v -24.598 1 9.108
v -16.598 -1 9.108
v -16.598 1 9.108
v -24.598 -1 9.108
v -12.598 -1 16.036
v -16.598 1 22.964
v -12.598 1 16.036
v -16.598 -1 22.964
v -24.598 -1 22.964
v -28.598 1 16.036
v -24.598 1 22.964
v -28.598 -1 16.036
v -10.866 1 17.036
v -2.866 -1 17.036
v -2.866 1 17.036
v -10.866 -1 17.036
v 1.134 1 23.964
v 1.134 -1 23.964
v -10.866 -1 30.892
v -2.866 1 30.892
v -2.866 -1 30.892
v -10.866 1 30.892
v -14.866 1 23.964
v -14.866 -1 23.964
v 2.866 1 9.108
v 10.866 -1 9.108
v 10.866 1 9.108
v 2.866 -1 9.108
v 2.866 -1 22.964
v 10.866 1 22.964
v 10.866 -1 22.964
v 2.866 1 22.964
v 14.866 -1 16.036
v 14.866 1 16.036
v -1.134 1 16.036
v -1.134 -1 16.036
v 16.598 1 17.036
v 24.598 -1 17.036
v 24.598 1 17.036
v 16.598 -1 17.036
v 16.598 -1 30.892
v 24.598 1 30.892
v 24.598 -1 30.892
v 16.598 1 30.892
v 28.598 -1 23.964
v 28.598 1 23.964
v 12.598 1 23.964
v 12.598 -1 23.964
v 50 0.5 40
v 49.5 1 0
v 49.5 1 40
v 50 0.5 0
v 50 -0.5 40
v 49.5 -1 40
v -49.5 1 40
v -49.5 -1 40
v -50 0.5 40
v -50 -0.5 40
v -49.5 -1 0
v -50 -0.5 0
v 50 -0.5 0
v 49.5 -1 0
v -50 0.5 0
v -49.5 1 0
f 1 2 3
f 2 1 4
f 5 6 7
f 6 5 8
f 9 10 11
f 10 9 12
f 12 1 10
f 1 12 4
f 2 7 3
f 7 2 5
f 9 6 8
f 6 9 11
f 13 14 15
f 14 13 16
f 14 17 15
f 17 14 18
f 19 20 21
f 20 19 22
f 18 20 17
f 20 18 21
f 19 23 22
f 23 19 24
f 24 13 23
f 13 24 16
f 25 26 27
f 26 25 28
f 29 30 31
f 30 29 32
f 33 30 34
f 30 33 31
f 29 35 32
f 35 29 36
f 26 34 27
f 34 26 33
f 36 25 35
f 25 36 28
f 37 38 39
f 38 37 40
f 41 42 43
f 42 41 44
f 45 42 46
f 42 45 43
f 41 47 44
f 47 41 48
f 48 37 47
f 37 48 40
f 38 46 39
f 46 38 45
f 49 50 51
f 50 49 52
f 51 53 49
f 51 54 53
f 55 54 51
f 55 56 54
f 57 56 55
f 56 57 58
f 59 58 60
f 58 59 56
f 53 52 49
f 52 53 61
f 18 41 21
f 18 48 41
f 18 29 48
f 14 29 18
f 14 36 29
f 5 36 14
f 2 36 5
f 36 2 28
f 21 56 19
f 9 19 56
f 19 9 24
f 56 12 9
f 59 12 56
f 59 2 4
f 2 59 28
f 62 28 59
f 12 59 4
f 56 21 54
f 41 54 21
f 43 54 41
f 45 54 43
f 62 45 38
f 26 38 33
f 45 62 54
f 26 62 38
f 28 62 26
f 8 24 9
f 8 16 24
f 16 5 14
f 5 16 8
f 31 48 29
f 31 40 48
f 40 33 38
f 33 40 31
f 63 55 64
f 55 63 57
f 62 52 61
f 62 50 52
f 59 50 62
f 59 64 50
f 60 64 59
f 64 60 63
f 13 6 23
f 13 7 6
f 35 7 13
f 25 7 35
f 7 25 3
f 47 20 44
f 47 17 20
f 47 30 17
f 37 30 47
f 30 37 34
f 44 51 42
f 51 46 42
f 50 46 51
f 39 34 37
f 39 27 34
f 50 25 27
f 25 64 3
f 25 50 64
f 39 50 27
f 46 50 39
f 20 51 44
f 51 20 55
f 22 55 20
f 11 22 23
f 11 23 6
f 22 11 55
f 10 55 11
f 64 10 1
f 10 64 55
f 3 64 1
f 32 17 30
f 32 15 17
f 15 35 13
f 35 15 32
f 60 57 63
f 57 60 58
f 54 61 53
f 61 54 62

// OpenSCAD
// The Drawer Dividers V3 – Wall
// Divider walls with optional hex/circle pattern and finger grip.

/* [Part] */
// Wall length (mm) – the designer tells you which lengths you need
Length = 100; // [20:0.1:400]
// Wall height (mm, 0 = automatic from the connector height)
Wall_Height = 0; // [0:0.1:150]
// Is this wall used with slip-on connectors? (lowers it by the floor thickness)
For_Slip_On = false;
// How many copies on the plate
Count = 1; // [1:1:40]
// Gap between copies (mm)
Spacing = 5; // [2:1:20]
// Print orientation
Orientation = "standing"; // [standing:Standing (strong, fast), flat:Flat (best with patterns)]

/* [Style] */
// Material-saving pattern
Pattern = "hex"; // [none:None, hex:Honeycomb, circle:Circles]
// Size of one cell (radius, mm)
Cell_Size = 8; // [2:0.5:30]
// Web between two cells (mm)
Web = 2; // [0.5:0.1:10]
// Solid border at both ends (mm, -1 = automatic: insert depth + 2)
Margin_Side = -1; // [-1:1:60]
// Solid border at top and bottom (mm)
Margin_Top_Bottom = 5; // [2:0.5:20]
// Chamfer on the short ends for easy insertion (mm)
End_Chamfer = 0.5; // [0:0.1:2]
// Finger grip at the top centre (radius in mm, 0 = off)
Grip = 0; // [0:0.5:20]

/* [System] */
// Exact thickness of your printed walls (mm)
Wall_Thickness = 2.0; // [0.8:0.1:10]
// Extra slot width so the wall does not bind (mm, 0.2 fits most printers)
Tolerance = 0.2; // [0:0.01:1]
// Height of the connectors (mm)
Height = 40; // [10:1:150]
// How deep the wall slides into an arm (mm)
Insert_Depth = 14; // [5:1:30]
// Closed cap on one end (mm, 0 = open on both ends)
Cap_Thickness = 0; // [0:0.5:10]
// Cap thickness of the slip-on connectors (mm)
Floor_Thickness = 2; // [0.5:0.1:5]
// Gap between wall top and cap (mm)
Top_Gap = 0.2; // [0:0.05:1]

/* [Hidden] */
$fn = 32;

P = dd_profile(
    wall_t = Wall_Thickness, tol = Tolerance, height = Height,
    insert = Insert_Depth, cap = Cap_Thickness, floor_t = Floor_Thickness,
    top_gap = Top_Gap);

h = Wall_Height > 0 ? Wall_Height : dd_wall_height(P, For_Slip_On);
t = dd(P, "wall_t");

module one_wall()
    dd_wall(Length, P, height = h, pattern = Pattern, cell = Cell_Size,
            web = Web, margin_side = Margin_Side, margin_tb = Margin_Top_Bottom,
            end_chamfer = End_Chamfer, grip = Grip);

if (Orientation == "flat")
    dd_grid(Count, Length + Spacing, h + Spacing) translate([0, h / 2, 0]) dd_lay_flat(t) one_wall();
else
    dd_grid(Count, Length + Spacing, t + Spacing) one_wall();

// ============================================================================
//  Library (scad/lib/drawer_divider.scad, inlined by tools/build.py)
// ============================================================================
// =============================================================================
//  The Drawer Dividers – core library (V3)
//  Usage:  use <lib/drawer_divider.scad>
//  All dimensions in mm. This file creates no geometry on its own.
// =============================================================================

DD_VERSION = "3.0.0";
DD_EPS = 0.01;

// =============================================================================
//  System profile
// =============================================================================
// Every part of one drawer is built from the same profile, so walls,
// connectors and rails always fit each other. A profile is a key/value list;
// read single values with dd(p, "key").

function dd_profile(
    wall_t   = 2.0,  // thickness of the printed walls
    tol      = 0.2,  // extra slot width so the wall does not bind
    height   = 40,   // connector height
    insert   = 14,   // how deep a wall slides into a connector arm
    shell    = 2.5,  // connector material left and right of the slot
    arm      = 20,   // arm length, measured from the connector centre
    fillet   = 10,   // inner fillet radius between two arms
    edge_r   = 0.6,  // rounding of the outer vertical edges
    cap      = 0,    // closed cap; 0 = slots open on both ends
    floor_t  = 2,    // cap thickness of slip-on connectors
    lead_in  = 1,    // chamfer at the open slot end
    efc      = 0.4,  // elephant foot compensation at the bed side
    magnet_d = 5,    // magnet / rubber foot pocket, 0 = off
    magnet_h = 2,
    end_gap  = 0.3,  // gap between wall end and pocket bottom
    top_gap  = 0.2   // gap between wall top and cap (capped connectors only)
) = [
    ["wall_t", wall_t], ["tol", tol], ["height", height], ["insert", insert],
    ["shell", shell], ["arm", arm], ["fillet", fillet], ["edge_r", edge_r],
    ["cap", cap], ["floor_t", floor_t], ["lead_in", lead_in], ["efc", efc],
    ["magnet_d", magnet_d], ["magnet_h", magnet_h], ["end_gap", end_gap],
    ["top_gap", top_gap]
];

function dd(p, key) =
    let(i = search([key], p)[0])
    assert(is_num(i), str("dd(): unknown profile key '", key, "'"))
    p[i][1];

// ---- derived values (the designer uses the same formulas) -------------------
// centre distance two connectors on one wall need so their arms do not collide
function dd_min_conn_gap(p) = 2 * dd(p, "arm") + 1;
function dd_slot_w(p)       = dd(p, "wall_t") + dd(p, "tol");
function dd_arm_w(p)        = dd_slot_w(p) + 2 * dd(p, "shell");
function dd_pocket_start(p) = dd(p, "arm") - dd(p, "insert");
// distance from a connector centre to the end of a fully inserted wall
function dd_wall_inset(p)   = dd_pocket_start(p) + dd(p, "end_gap");
function dd_cap(p, slip = false) =
    slip ? max(dd(p, "cap"), dd(p, "floor_t")) : dd(p, "cap");
function dd_wall_height(p, slip = false) =
    let(c = dd_cap(p, slip))
    dd(p, "height") - (c > 0 ? c + dd(p, "top_gap") : 0);
// wall length for two connector centres `center_dist` apart
function dd_wall_length(center_dist, p, ends = 2) =
    center_dist - ends * dd_wall_inset(p);

// =============================================================================
//  Connectors
// =============================================================================
// Directions: 0 = +X, 1 = +Y, 2 = -X, 3 = -Y.
// Definition: [arms, slots, through_y, slip_on]
//   through_y: one continuous slot along Y (the wall passes straight through)
//   slip_on:   printed cap-down, then flipped and pushed onto the walls

function dd_connector_types() = ["cross", "tee", "corner", "straight", "end",
                                  "slip_cross", "slip_tee", "slip_corner_r", "slip_corner_l"];

function dd_connector_def(type) =
    type == "cross"         ? [[1,1,1,1], [1,1,1,1], false, false] :
    type == "tee"           ? [[1,1,1,0], [1,1,1,0], false, false] :
    type == "corner"        ? [[1,1,0,0], [1,1,0,0], false, false] :
    type == "straight"      ? [[1,0,1,0], [1,0,1,0], false, false] :
    type == "end"           ? [[1,0,0,0], [1,0,0,0], false, false] :
    type == "slip_cross"    ? [[1,1,1,1], [1,1,1,1], true,  true ] :
    type == "slip_tee"      ? [[1,1,0,1], [1,1,0,1], true,  true ] :
    type == "slip_corner_r" ? [[1,1,0,0], [1,1,0,1], true,  true ] :
    type == "slip_corner_l" ? [[0,1,1,0], [0,1,1,1], true,  true ] :
    undef;

module dd_connector(type = "cross", p = dd_profile()) {
    def = dd_connector_def(type);
    assert(!is_undef(def), str("dd_connector(): unknown type '", type, "'"));
    dd_connector_custom(arms = def[0], slots = def[1], through_y = def[2],
                        cap = dd_cap(p, def[3]), p = p);
}

// Build any connector from an arm/slot pattern.
module dd_connector_custom(arms = [1,1,1,1], slots = undef, through_y = false,
                           cap = 0, p = dd_profile()) {
    sl  = is_undef(slots) ? arms : slots;
    h   = dd(p, "height");
    aw  = dd_arm_w(p);
    arm = dd(p, "arm");
    ps  = dd_pocket_start(p);
    md  = dd(p, "magnet_d");
    z0  = cap > 0 ? cap : -1;   // slots start above the cap

    difference() {
        linear_extrude(h) dd_connector_outline(arms, p);

        for (i = [0:3]) if (sl[i] && !(through_y && i == 3))
            rotate(90 * i)
                dd_slot_cut(x0 = (through_y && i == 1) ? -(arm + 1) : ps,
                            x1 = arm + 1, z0 = z0, p = p);

        // magnet pocket on the side that faces the drawer floor in use
        if (!through_y && md > 0 && md <= min(aw, 2 * ps) - 1) {
            mh = dd(p, "magnet_h");
            if (cap > 0) translate([0, 0, h - mh]) cylinder(d = md, h = mh + 1, $fn = 48);
            else translate([0, 0, -DD_EPS]) cylinder(d = md, h = mh + DD_EPS, $fn = 48);
        }
    }
}

module dd_connector_outline(arms, p) {
    aw = dd_arm_w(p);
    dd_round_convex(dd(p, "edge_r"))
    dd_round_concave(dd(p, "fillet"))
    union() {
        square(aw, center = true);
        for (i = [0:3]) if (arms[i])
            rotate(90 * i) translate([0, -aw / 2]) square([dd(p, "arm"), aw]);
    }
}

// one slot along +X from x0 to x1, open at the top
module dd_slot_cut(x0, x1, z0, p) {
    h    = dd(p, "height");
    sw   = dd_slot_w(p);
    li   = dd(p, "lead_in");
    efc  = dd(p, "efc");
    len  = x1 - x0;

    translate([x0, -sw / 2, z0]) cube([len, sw, h - z0 + 1]);

    if (li > 0) hull() {
        translate([x0, -sw / 2, h - li]) cube([len, sw, DD_EPS]);
        translate([x0, -sw / 2 - li, h]) cube([len, sw + 2 * li, 1]);
    }
    // only where the slot touches the print bed
    if (z0 < 0 && efc > 0) hull() {
        translate([x0, -sw / 2 - efc, -1]) cube([len, sw + 2 * efc, 1]);
        translate([x0, -sw / 2, efc]) cube([len, sw, DD_EPS]);
    }
}

// footprint size, used to space copies on the plate
function dd_connector_size(p) = 2 * dd(p, "arm");

// =============================================================================
//  Walls
// =============================================================================
// Built standing: X = length, Y = thickness (centred), Z = height.

module dd_wall(length, p = dd_profile(), height = undef, pattern = "none",
               cell = 8, web = 2, margin_side = -1, margin_tb = 5,
               end_chamfer = 0.5, grip = 0) {
    h  = is_undef(height) ? dd_wall_height(p) : height;
    t  = dd(p, "wall_t");
    // keep the pattern out of the connector pockets
    ms = margin_side < 0 ? dd(p, "insert") + 2 : margin_side;

    difference() {
        linear_extrude(h) dd_wall_2d(length, t, end_chamfer);
        dd_wall_pattern(length, t, h, pattern, cell, web, ms,
                        margin_tb, margin_tb + grip);
        if (grip > 0)
            translate([0, 0, h]) rotate([90, 0, 0])
                cylinder(r = grip, h = t + 2, center = true, $fn = 48);
    }
}

module dd_wall_2d(l, t, c) {
    ce = min(c, t / 2 - 0.01);
    if (ce > 0)
        polygon([
            [-l/2 + ce, -t/2], [ l/2 - ce, -t/2], [ l/2, -t/2 + ce], [ l/2,  t/2 - ce],
            [ l/2 - ce,  t/2], [-l/2 + ce,  t/2], [-l/2,  t/2 - ce], [-l/2, -t/2 + ce]
        ]);
    else
        square([l, t], center = true);
}

// Hex or circle pattern with a constant web between the holes.
module dd_wall_pattern(l, t, h, pattern, cell, web, ms, mb, mt) {
    if (pattern == "hex" || pattern == "circle") {
        hex   = pattern == "hex";
        D     = hex ? cell * sqrt(3) + web : 2 * cell + web;  // vertical pitch
        ext_x = cell;
        ext_z = hex ? cell * sqrt(3) / 2 : cell;
        max_w = l - 2 * ms - 2 * ext_x;
        max_h = h - mb - mt - 2 * ext_z;
        stagger = max_h >= D / 2;
        sx    = stagger ? D * sqrt(3) / 2 : 2 * cell + web;
        cols  = max_w >= 0 ? floor(max_w / sx) + 1 : 0;
        st    = stagger && cols > 1;
        rows  = max_h >= 0 ? floor((max_h - (st ? D / 2 : 0)) / D) + 1 : 0;

        if (cols > 0 && rows > 0) {
            pw = (cols - 1) * sx;
            ph = (rows - 1) * D + (st ? D / 2 : 0);
            z0 = mb + ext_z + (max_h - ph) / 2;
            for (c = [0 : cols - 1], r = [0 : rows - 1])
                translate([-pw / 2 + c * sx, 0, z0 + r * D + (st && c % 2 == 1 ? D / 2 : 0)])
                    rotate([90, 0, 0])
                        cylinder(r = cell, h = t + 2, center = true, $fn = hex ? 6 : 32);
        }
    }
}

// =============================================================================
//  Rails ("Raster Wall") – glued or screwed to the drawer side
// =============================================================================
// Built flat: X = length, Y = width (= height in the drawer), Z = thickness.
// Teeth form slots of the system slot width. teeth_offset = position of the
// first tooth from x = 0; -1 centres the pattern. Joined rails use explicit
// offsets so the slot pitch continues across the joint.

function dd_rail_pitch(p, tooth_t = 2) = tooth_t + dd_slot_w(p);

function dd_rail_center_offset(length, p, tooth_t = 2) =
    let(sw = dd_slot_w(p), pitch = tooth_t + sw,
        n = max(1, floor((length + sw) / pitch)),
        used = n * tooth_t + (n - 1) * sw)
    (length - used) / 2;

module dd_rail(length, width, p = dd_profile(), plate = 2.5, tooth_t = 2,
               tooth_h = 6, tooth_chamfer = 0.6, tooth_fillet = 0.5,
               teeth_offset = -1, teeth = true, tongue = true, socket = true,
               tongue_len = 2, tongue_w = -1, tongue_chamfer = 1,
               tol_w = 1, tol_d = 0.5, tol_z = 0.1,
               screws = 3, screw_d = 3.2, head_d = 6.5) {
    sw    = dd_slot_w(p);
    pitch = tooth_t + sw;
    x0    = teeth_offset >= 0 ? teeth_offset : dd_rail_center_offset(length, p, tooth_t);
    n     = floor((length - x0 - tooth_t) / pitch) + 1;
    tw    = tongue_w < 0 ? max(width - 12, width * 0.6) : min(tongue_w, width - 4);
    zt    = plate / 2 - tol_z / 2;
    zs    = plate / 2 + tol_z / 2;

    difference() {
        union() {
            cube([length, width, plate]);
            if (tongue)
                translate([length, (width - tw) / 2, 0]) linear_extrude(zt)
                    polygon([[0, 0], [tongue_len, tongue_chamfer],
                             [tongue_len, tw - tongue_chamfer], [0, tw]]);
            if (teeth && n > 0)
                for (i = [0 : n - 1])
                    translate([x0 + i * pitch, 0, plate - DD_EPS])
                        dd_rail_tooth(width, tooth_t, tooth_h, tooth_chamfer, tooth_fillet);
        }
        if (socket) {
            bw = tw + 2 * tol_w;
            translate([-DD_EPS, (width - bw) / 2, -DD_EPS])
                cube([tongue_len + tol_d + DD_EPS, bw, zs + DD_EPS]);
        }
        // screws sit in the middle of a slot so they damage as few teeth as possible
        if (screws > 0) for (s = [1 : screws]) {
            k  = round((length * s / (screws + 1) - x0 - tooth_t - sw / 2) / pitch);
            xs = x0 + tooth_t + sw / 2 + k * pitch;
            cs = min(1.5, plate - 0.4);
            translate([xs, width / 2, 0]) {
                translate([0, 0, -1]) cylinder(d = screw_d, h = plate + 2, $fn = 32);
                translate([0, 0, plate - cs]) cylinder(d1 = screw_d, d2 = head_d, h = cs + DD_EPS, $fn = 32);
                translate([0, 0, plate]) cylinder(d = head_d + 0.5, h = tooth_h + 1, $fn = 32);
            }
        }
    }
}

// One tooth across the full rail width, with lead-in chamfer and base fillets.
// Keep tooth_fillet <= the wall end chamfer so walls still reach the plate.
module dd_rail_tooth(width, tt, th, ch, fr) {
    c = max(0, min(ch, tt / 2 - 0.2, th - 0.5));
    translate([0, width, 0]) rotate([90, 0, 0]) linear_extrude(width) {
        polygon([[0, 0], [tt, 0], [tt, th - c], [tt - c, th], [c, th], [0, th - c]]);
        if (fr > 0) {
            translate([tt, 0]) dd_fillet_2d(fr);
            mirror([1, 0]) dd_fillet_2d(fr);
        }
    }
}

// =============================================================================
//  Tolerance test
// =============================================================================
// A bar with one slot per tolerance (value engraved next to it) plus a short
// test wall. Print both, find the slot that fits best, use that tolerance.

module dd_tolerance_test(p = dd_profile(), tols = [0.1, 0.15, 0.2, 0.25, 0.3],
                         height = 12, depth = 20, land = 8, base = 1.2,
                         coupon = true) {
    t = dd(p, "wall_t");
    n = len(tols);
    function x_at(i) = land * (i + 1) + i * t + dd_sum(tols, i);
    L = x_at(n);

    difference() {
        cube([L, depth, height]);
        for (i = [0 : n - 1]) {
            translate([x_at(i), -1, base]) cube([t + tols[i], depth + 2, height]);
            translate([x_at(i) - land / 2, depth / 2, height - 0.6])
                linear_extrude(1) rotate(90)
                    text(str(tols[i]), size = min(3.2, land * 0.42),
                         halign = "center", valign = "center");
        }
    }
    if (coupon)
        translate([L / 2, depth + 8, 0])
            dd_wall(30, p, height = height + 4, end_chamfer = 0.3);
}

// =============================================================================
//  Helpers
// =============================================================================

function dd_sum(v, n) = n <= 0 ? 0 : v[n - 1] + dd_sum(v, n - 1);

module dd_round_concave(r) { if (r > 0) offset(r = -r) offset(r = r) children(); else children(); }
module dd_round_convex(r)  { if (r > 0) offset(r = r) offset(delta = -r) children(); else children(); }

module dd_fillet_2d(r) {
    difference() {
        square([r, r]);
        translate([r, r]) circle(r = r, $fn = 24);
    }
}

// Arrange `count` copies of the child in rows that fit max_w, centred on the origin.
module dd_grid(count, pitch_x, pitch_y, max_w = 240) {
    cols = max(1, min(count, floor((max_w + DD_EPS) / pitch_x)));
    rows = ceil(count / cols);
    for (i = [0 : count - 1])
        translate([((i % cols) - (cols - 1) / 2) * pitch_x,
                   (floor(i / cols) - (rows - 1) / 2) * pitch_y, 0])
            children();
}

// Lay a standing wall flat on the bed.
module dd_lay_flat(t) { translate([0, 0, t / 2]) rotate([90, 0, 0]) children(); }

// =============================================================================
//  Drawer layout – used by drawer_designer.scad
// =============================================================================
// The drawer is cut into strips (u axis), each strip into compartments
// (v axis). Strip walls run through from edge to edge. Strips run front to
// back unless `swap` is set. dd_layout() works in u/v and returns world
// coordinates: x = width, y = depth, front edge at y = 0.
// Directions: 0 = +X, 1 = +Y, 2 = -X, 3 = -Y.

function dd_le() = 0.01;   // a function, so inlined single files can use it before this line

// ---- string parsing ("1,1,2" and "2,1:2") ----------------------------------
function dd_str_split(s, sep, i = 0, cur = "", acc = []) =
    i >= len(s) ? concat(acc, [cur])
  : s[i] == sep ? dd_str_split(s, sep, i + 1, "", concat(acc, [cur]))
  : dd_str_split(s, sep, i + 1, str(cur, s[i]), acc);

function dd_str_num(s) = dd__num([for (c = s) if (c != " ") c], 0, 0, 0, 1);
function dd__num(c, i, v, frac, sign) =
    i >= len(c) ? sign * v
  : c[i] == "-" ? dd__num(c, i + 1, v, frac, -1)
  : c[i] == "." ? dd__num(c, i + 1, v, max(frac, 0.1), sign)
  : let(d = ord(c[i]) - 48)
    d < 0 || d > 9 ? dd__num(c, i + 1, v, frac, sign)
  : frac > 0 ? dd__num(c, i + 1, v + d * frac, frac / 10, sign)
             : dd__num(c, i + 1, v * 10 + d, 0, sign);

// "1,1,2" -> [1,1,2]
function dd_parse_weights(s) =
    let(v = [for (p = dd_str_split(s, ",")) let(n = dd_str_num(p)) if (n > 0) n])
    len(v) ? v : [1];

// "2,1:2" -> one weight list per strip; a plain number n = n equal parts.
// Missing entries repeat the last one.
function dd_parse_splits(s, n) =
    let(per = [for (it = dd_str_split(s, ","))
                  let(p = [for (x = dd_str_split(it, ":")) let(v = dd_str_num(x)) if (v > 0) v])
                  len(p) == 0 ? [1]
                : len(p) == 1 ? [for (k = [1 : max(1, round(p[0]))]) 1] : p])
    [for (i = [0 : n - 1]) per[min(i, len(per) - 1)]];

// ---- small list helpers ----------------------------------------------------
function dd_has_num(l, x) = len([for (y = l) if (abs(y - x) < dd_le()) 1]) > 0;
function dd_sort(a) =
    len(a) <= 1 ? a :
    let(p = a[floor(len(a) / 2)])
    concat(dd_sort([for (x = a) if (x < p) x]), [for (x = a) if (x == p) x], dd_sort([for (x = a) if (x > p) x]));
function dd_uniq_sorted(l) = [for (k = [0 : 1 : len(l) - 1]) if (k == 0 || l[k] - l[k - 1] > dd_le()) l[k]];
function dd_unique(l, i = 0, acc = []) =
    i >= len(l) ? acc : dd_unique(l, i + 1, len([for (y = acc) if (y == l[i]) 1]) ? acc : concat(acc, [l[i]]));
function dd_count(l, x) = len([for (y = l) if (y == x) 1]);
function dd_nearest(l, v) = len(l) == 0 ? v : let(d = [for (x = l) abs(x - v)]) l[search(min(d), d)[0]];
function dd_fmt(v, d = 1) = str(round(v * pow(10, d)) / pow(10, d));

// ---- options ---------------------------------------------------------------
function dd_layout_opts(width = 400, depth = 300, height = 60, strips = "1,1,1",
                        splits = "2", swap = false, edge = "frame", slip = false,
                        max_len = 240, edge_gap = 0.5, clamp_gap = 1,
                        rail_plate = 2.5, tooth_t = 2, tooth_h = 6) = [
    ["width", width], ["depth", depth], ["height", height], ["strips", strips],
    ["splits", splits], ["swap", swap], ["edge", edge], ["slip", slip],
    ["max_len", max_len], ["edge_gap", edge_gap], ["clamp_gap", clamp_gap],
    ["rail_plate", rail_plate], ["tooth_t", tooth_t], ["tooth_h", tooth_h]
];

// Rail tooth pattern along one world axis. Rails on the left/right sides run
// the full depth; front/back rails sit between them.
function dd_lay_rail_span(axis, W, D, rt) =
    axis == "y" ? [0.5, D - 1] : [rt + 0.5, W - 2 * rt - 1];

function dd_lay_rail_slots(axis, W, D, rt, tt, p) =
    let(sp = dd_lay_rail_span(axis, W, D, rt), sw = dd_slot_w(p), pitch = tt + sw,
        n = max(1, floor((sp[1] + sw) / pitch)),
        first = sp[0] + dd_rail_center_offset(sp[1], p, tt))
    [for (k = [0 : 1 : n - 2]) first + tt + sw / 2 + k * pitch];

// interior wall centres between c0 and c1 so the *net* compartments follow the weights
function dd_lay_split(c0, c1, off, w, t) =
    let(n = len(w), net = (c1 - off) - (c0 + off) - (n - 1) * t, tot = dd_sum(w, n))
    [for (k = [1 : 1 : n - 1]) c0 + off + net * dd_sum(w, k) / tot + (k - 1) * t + t / 2];

// node: [u, v, dirs, kind ("conn"|"edge"), type, through ("u"|"v"|""), end offset, joint]
function dd_lay_node(u, v, d, edge, slip, end_off, joint = false) =
    let(n = d[0] + d[1] + d[2] + d[3])
    n == 1 && (edge == "rail" || edge == "none") ? [u, v, d, "edge", "", "", end_off, false] :
    let(t0 = n == 4 ? "cross" : n == 3 ? "tee" : n == 1 ? "end"
           : (d[0] == 1 && d[2] == 1) || (d[1] == 1 && d[3] == 1) ? "straight" : "corner",
        th = slip && n >= 3 ? (d[1] == 1 && d[3] == 1 ? "v" : "u") : "")
    [u, v, d, "conn", th == "" ? t0 : (n == 4 ? "slip_cross" : "slip_tee"), th, 0, joint];

// slip-on: positions along a through wall where it should end at a crossing instead of
// getting a joiner squeezed between two connectors (greedy, each piece <= maxlen)
function dd_lay_slip_cuts(stops, prev, last, ins, maxlen, acc = []) =
    last - prev - 2 * ins <= maxlen ? acc :
    let(ok = [for (u = stops) if (u > prev + dd_le() && u < last - dd_le() && u - prev - 2 * ins <= maxlen) u])
    len(ok) == 0 ? acc : dd_lay_slip_cuts(stops, max(ok), last, ins, maxlen, concat(acc, [max(ok)]));

function dd_lay_find(nodes, u, v) =
    let(m = [for (n = nodes) if (abs(n[0] - u) < dd_le() && abs(n[1] - v) < dd_le()) n]) m[0];

function dd_lay_align(v, m, i = 0, acc = []) =
    i >= len(v) ? acc :
    dd_lay_align(v, m, i + 1, concat(acc, [i == 0 ? v[0] :
        [for (y = v[i]) let(prev = acc[i - 1], d = [for (q = prev) abs(q - y)])
            len(prev) && min(d) < m ? prev[search(min(d), d)[0]] : y]]));

function dd_lay_off(n, ins) = n[3] == "edge" ? n[6] : ins;

// joints that split a too long wall, kept clear of other connectors on the line
function dd_lay_kpieces(total, ins, maxlen, k = 1) =
    (total - (k - 1) * 2 * ins) / k <= maxlen || k >= 50 ? k : dd_lay_kpieces(total, ins, maxlen, k + 1);

function dd_lay_joints(u0, u1, o0, o1, ins, maxlen, avoid, clear) =
    let(total = u1 - u0 - o0 - o1, k = dd_lay_kpieces(total, ins, maxlen),
        pl = (total - (k - 1) * 2 * ins) / k)
    k <= 1 ? [] : dd__joints(1, k, u0 + o0, pl, ins, maxlen, avoid, clear, []);

function dd__joints(j, k, start, pl, ins, maxlen, avoid, clear, acc) =
    j >= k ? acc :
    let(ideal = start + j * pl + (2 * j - 1) * ins,
        prev  = len(acc) ? acc[len(acc) - 1] + ins : start,
        cands = [for (d = [0 : 2.5 : 80], c = [ideal + d, ideal - d])
                    if (len([for (a = avoid) if (abs(a - c) < clear) 1]) == 0 && c - ins - prev <= maxlen) c])
    dd__joints(j + 1, k, start, pl, ins, maxlen, avoid, clear, concat(acc, [len(cands) ? cands[0] : ideal]));

// cuts: [[u, offset], ...] -> [pieces [[ori, c, s, e]], joints [[ori, c, u]]]
function dd_lay_line(ori, c, cuts, avoid, ins, maxlen, clear) =
    let(segs = [for (k = [0 : 1 : len(cuts) - 2])
        let(u0 = cuts[k][0], o0 = cuts[k][1], u1 = cuts[k + 1][0], o1 = cuts[k + 1][1],
            js = dd_lay_joints(u0, u1, o0, o1, ins, maxlen,
                               [for (a = avoid) if (a > u0 + dd_le() && a < u1 - dd_le()) a], clear),
            b  = concat([u0 + o0], [for (jc = js) each [jc - ins, jc + ins]], [u1 - o1]))
        [[for (m = [0 : 2 : len(b) - 2]) [ori, c, b[m], b[m + 1]]], js]])
    [[for (s = segs) each s[0]], [for (s = segs) for (jc = s[1]) [ori, c, jc]]];

// Returns a key/value list:
//   walls  [[axis "x"|"y", c, start, end, length], ...]   axis = direction the wall runs
//   conns  [[type, x, y, dirs, through "x"|"y"|"", joint], ...]
//   rails  [[side "L"|"R"|"F"|"B", start, end, length, teeth_offset, tongue, socket, screws], ...]
//   comps  [[x0, y0, x1, y1, net_w, net_d], ...]
//   wall_h, rail_w, rail_t, inset
function dd_layout(p, o) =
    let(
        W = dd(o, "width"), D = dd(o, "depth"), swap = dd(o, "swap"),
        U = swap ? D : W, V = swap ? W : D,
        edge = dd(o, "edge"), slip = dd(o, "slip"), frame = edge == "frame", rail = edge == "rail",
        maxlen = dd(o, "max_len"),
        t = dd(p, "wall_t"), aw = dd_arm_w(p), ins = dd_wall_inset(p),
        tt = dd(o, "tooth_t"), rt = dd(o, "rail_plate") + dd(o, "tooth_h"),
        B = (frame || edge == "endcap") ? aw / 2 + dd(o, "edge_gap") : 0,
        base = frame ? B : 0,
        eoff = frame ? t / 2 : rail ? rt : 0,
        end_off = rail ? dd(o, "rail_plate") + dd(p, "end_gap") : dd(o, "clamp_gap"),
        clear = 2 * dd(p, "arm") + 2,
        cols = dd_parse_weights(dd(o, "strips")), ncol = len(cols),
        rows = dd_parse_splits(dd(o, "splits"), ncol),
        su = rail ? dd_lay_rail_slots(swap ? "y" : "x", W, D, rt, tt, p) : [],
        sv = rail ? dd_lay_rail_slots(swap ? "x" : "y", W, D, rt, tt, p) : [],
        us = concat([base], [for (x = dd_lay_split(base, U - base, eoff, cols, t)) rail ? dd_nearest(su, x) : x], [U - base]),
        // compartment borders that almost line up with the neighbouring strip snap onto it,
        // otherwise the arms of the two connectors on the strip wall would collide
        vsi = dd_lay_align([for (i = [0 : ncol - 1])
                  [for (y = dd_lay_split(base, V - base, eoff, rows[i], t)) rail ? dd_nearest(sv, y) : y]],
                  dd_min_conn_gap(p)),

        // nodes on the through-running strip walls (and the frame sides)
        vjs = frame ? [for (j = [0 : ncol]) j] : [for (j = [1 : 1 : ncol - 1]) j],
        vstops = [for (j = [0 : ncol])
                     dd_uniq_sorted(dd_sort(concat([B, V - B], j >= 1 ? vsi[j - 1] : [], j < ncol ? vsi[j] : [])))],
        // slip-on: crossings where too long through walls end (they become normal connectors)
        vcut = [for (j = [0 : ncol]) slip ? dd_lay_slip_cuts(vstops[j], B, V - B, ins, maxlen) : []],
        fcut = slip && frame ? dd_lay_slip_cuts([for (k = [1 : 1 : ncol - 1]) us[k]], us[0], us[ncol], ins, maxlen) : [],
        vnodes = [for (j = vjs, v = vstops[j])
            let(isEnd = abs(v - B) < dd_le() || abs(v - (V - B)) < dd_le(),
                slipHere = slip && !(isEnd ? dd_has_num(fcut, us[j]) : dd_has_num(vcut[j], v)),
                d = [(j < ncol && dd_has_num(vsi[j], v)) || (frame && isEnd && j < ncol) ? 1 : 0,
                     v < V - B - dd_le() ? 1 : 0,
                     (j >= 1 && dd_has_num(vsi[j - 1], v)) || (frame && isEnd && j > 0) ? 1 : 0,
                     v > B + dd_le() ? 1 : 0])
            dd_lay_node(us[j], v, d, edge, slipHere, end_off)],
        // compartment walls that end at the drawer side
        hnodes = frame ? [] : concat(
            [for (v = vsi[0]) dd_lay_node(B, v, [1, 0, 0, 0], edge, slip, end_off)],
            [for (v = vsi[ncol - 1]) dd_lay_node(U - B, v, [0, 0, 1, 0], edge, slip, end_off)]),
        nodes = concat(vnodes, hnodes),

        vlines = [for (j = vjs)
            dd_lay_line("v", us[j],
                [for (v = vstops[j]) let(n = dd_lay_find(nodes, us[j], v))
                    if (abs(v - B) < dd_le() || abs(v - (V - B)) < dd_le() || n[5] != "v") [v, dd_lay_off(n, ins)]],
                vstops[j], ins, maxlen, clear)],
        hlines = [for (i = [0 : ncol - 1], v = vsi[i])
            let(ua = i == 0 ? B : us[i], ub = i == ncol - 1 ? U - B : us[i + 1])
            dd_lay_line("u", v, [[ua, dd_lay_off(dd_lay_find(nodes, ua, v), ins)],
                                 [ub, dd_lay_off(dd_lay_find(nodes, ub, v), ins)]],
                        [], ins, maxlen, clear)],
        flines = frame ? [for (v = [B, V - B])
            dd_lay_line("u", v, [for (k = [0 : ncol]) if (k == 0 || k == ncol || !slip || dd_has_num(fcut, us[k])) [us[k], ins]],
                        us, ins, maxlen, clear)] : [],
        lines = concat(vlines, hlines, flines),
        pieces = [for (l = lines) each l[0]],
        joints = [for (l = lines, jn = l[1])
            dd_lay_node(jn[0] == "u" ? jn[2] : jn[1], jn[0] == "u" ? jn[1] : jn[2],
                        jn[0] == "u" ? [1, 0, 1, 0] : [0, 1, 0, 1], edge, false, 0, true)],
        lconns = concat([for (n = nodes) if (n[3] == "conn") n], joints),

        // world coordinates
        walls = [for (pc = pieces)
            [(pc[0] == "u") != swap ? "x" : "y", pc[1], pc[2], pc[3], pc[3] - pc[2]]],
        conns = [for (n = lconns)
            [n[4], swap ? n[1] : n[0], swap ? n[0] : n[1],
             swap ? [n[2][1], n[2][0], n[2][3], n[2][2]] : n[2],
             n[5] == "" ? "" : ((n[5] == "u") != swap ? "x" : "y"), n[7]]],

        // rails: one or more pieces per drawer side that has wall ends
        wall_h = dd_wall_height(p, slip),
        rail_w = min(wall_h, dd(o, "height")),
        uEdges = rail ? [len(vsi[0]) > 0, len(vsi[ncol - 1]) > 0] : [false, false],
        vEdges = rail ? [ncol > 1, ncol > 1] : [false, false],
        sides = [for (s = [["L", swap ? vEdges[0] : uEdges[0]], ["R", swap ? vEdges[1] : uEdges[1]],
                           ["F", swap ? uEdges[0] : vEdges[0]], ["B", swap ? uEdges[1] : vEdges[1]]]) if (s[1]) s[0]],
        pitch = tt + dd_slot_w(p),
        rails = [for (side = sides)
            let(axis = side == "L" || side == "R" ? "y" : "x",
                sp = dd_lay_rail_span(axis, W, D, rt),
                first = sp[0] + dd_rail_center_offset(sp[1], p, tt),
                k = ceil(sp[1] / maxlen), pl = sp[1] / k)
            for (i = [0 : k - 1])
                let(ps = sp[0] + i * pl)
                [side, ps, ps + pl, pl, ((first - ps) % pitch + pitch) % pitch, i < k - 1, i > 0,
                 max(1, round(pl / 70))]],

        // compartments with their net (inside) size
        comps = [for (i = [0 : ncol - 1])
            let(vs = concat([base], vsi[i], [V - base]), u0 = us[i], u1 = us[i + 1])
            for (k = [0 : len(vs) - 2])
                let(v0 = vs[k], v1 = vs[k + 1],
                    so = [for (c = [[u0, U], [u1, U], [v0, V], [v1, V]])
                             abs(c[0]) < dd_le() || abs(c[0] - c[1]) < dd_le() ? (rail ? rt : 0) : t / 2],
                    nu = u1 - u0 - so[0] - so[1], nv = v1 - v0 - so[2] - so[3])
                swap ? [v0, u0, v1, u1, nv, nu] : [u0, v0, u1, v1, nu, nv]]
    ) [
        ["walls", walls], ["conns", conns], ["rails", rails], ["comps", comps],
        ["wall_h", wall_h], ["rail_w", rail_w], ["rail_t", rt], ["inset", B]
    ];

// ---- parts list ------------------------------------------------------------
function dd_wall_len_round(l) = floor(l * 10 + 0.05) / 10;

// Connectors whose bodies overlap: on one line each reaches an arm length towards
// its neighbour where it has an arm, half its width where it has none.
// Returns the indices into dd(L, "conns") that collide with another connector.
function dd_layout_clashes(L, p) =
    let(cs = dd(L, "conns"), n = len(cs), arm = dd(p, "arm"), aw = dd_arm_w(p),
        reach = function(d, i) d[i] ? arm : aw / 2,
        hit = function(a, b)
            let(sameY = abs(a[2] - b[2]) < dd_le(), sameX = abs(a[1] - b[1]) < dd_le(),
                lo = sameY ? (a[1] < b[1] ? a : b) : (a[2] < b[2] ? a : b),
                hi = lo == a ? b : a)
            sameY ? hi[1] - lo[1] < reach(lo[3], 0) + reach(hi[3], 2) + 1 - dd_le()
          : sameX ? hi[2] - lo[2] < reach(lo[3], 1) + reach(hi[3], 3) + 1 - dd_le()
          : false)
    [for (i = [0 : 1 : n - 1]) if (len([for (j = [0 : 1 : n - 1]) if (j != i && hit(cs[i], cs[j])) 1]) > 0) i];

// [[kind "c"|"w"|"r", spec, qty], ...] – connectors, then walls (longest first), then rails
function dd_layout_bom(L) =
    let(conns = dd(L, "conns"), walls = dd(L, "walls"), rails = dd(L, "rails"),
        ctypes = [for (c = conns) c[0]],
        lens   = [for (w = walls) if (w[4] > 0) dd_wall_len_round(w[4])],
        ulens  = dd_uniq_sorted(dd_sort(lens)),
        rspec  = [for (r = rails) [round(r[3] * 100) / 100, round(r[4] * 100) / 100, r[5], r[6], r[7]]])
    concat(
        [for (t = dd_connector_types()) if (dd_count(ctypes, t) > 0) ["c", t, dd_count(ctypes, t)]],
        [for (k = [len(ulens) - 1 : -1 : 0]) ["w", ulens[k], len([for (l = lens) if (abs(l - ulens[k]) < dd_le()) 1])]],
        [for (r = dd_unique(rspec)) ["r", r, dd_count(rspec, r)]]);
